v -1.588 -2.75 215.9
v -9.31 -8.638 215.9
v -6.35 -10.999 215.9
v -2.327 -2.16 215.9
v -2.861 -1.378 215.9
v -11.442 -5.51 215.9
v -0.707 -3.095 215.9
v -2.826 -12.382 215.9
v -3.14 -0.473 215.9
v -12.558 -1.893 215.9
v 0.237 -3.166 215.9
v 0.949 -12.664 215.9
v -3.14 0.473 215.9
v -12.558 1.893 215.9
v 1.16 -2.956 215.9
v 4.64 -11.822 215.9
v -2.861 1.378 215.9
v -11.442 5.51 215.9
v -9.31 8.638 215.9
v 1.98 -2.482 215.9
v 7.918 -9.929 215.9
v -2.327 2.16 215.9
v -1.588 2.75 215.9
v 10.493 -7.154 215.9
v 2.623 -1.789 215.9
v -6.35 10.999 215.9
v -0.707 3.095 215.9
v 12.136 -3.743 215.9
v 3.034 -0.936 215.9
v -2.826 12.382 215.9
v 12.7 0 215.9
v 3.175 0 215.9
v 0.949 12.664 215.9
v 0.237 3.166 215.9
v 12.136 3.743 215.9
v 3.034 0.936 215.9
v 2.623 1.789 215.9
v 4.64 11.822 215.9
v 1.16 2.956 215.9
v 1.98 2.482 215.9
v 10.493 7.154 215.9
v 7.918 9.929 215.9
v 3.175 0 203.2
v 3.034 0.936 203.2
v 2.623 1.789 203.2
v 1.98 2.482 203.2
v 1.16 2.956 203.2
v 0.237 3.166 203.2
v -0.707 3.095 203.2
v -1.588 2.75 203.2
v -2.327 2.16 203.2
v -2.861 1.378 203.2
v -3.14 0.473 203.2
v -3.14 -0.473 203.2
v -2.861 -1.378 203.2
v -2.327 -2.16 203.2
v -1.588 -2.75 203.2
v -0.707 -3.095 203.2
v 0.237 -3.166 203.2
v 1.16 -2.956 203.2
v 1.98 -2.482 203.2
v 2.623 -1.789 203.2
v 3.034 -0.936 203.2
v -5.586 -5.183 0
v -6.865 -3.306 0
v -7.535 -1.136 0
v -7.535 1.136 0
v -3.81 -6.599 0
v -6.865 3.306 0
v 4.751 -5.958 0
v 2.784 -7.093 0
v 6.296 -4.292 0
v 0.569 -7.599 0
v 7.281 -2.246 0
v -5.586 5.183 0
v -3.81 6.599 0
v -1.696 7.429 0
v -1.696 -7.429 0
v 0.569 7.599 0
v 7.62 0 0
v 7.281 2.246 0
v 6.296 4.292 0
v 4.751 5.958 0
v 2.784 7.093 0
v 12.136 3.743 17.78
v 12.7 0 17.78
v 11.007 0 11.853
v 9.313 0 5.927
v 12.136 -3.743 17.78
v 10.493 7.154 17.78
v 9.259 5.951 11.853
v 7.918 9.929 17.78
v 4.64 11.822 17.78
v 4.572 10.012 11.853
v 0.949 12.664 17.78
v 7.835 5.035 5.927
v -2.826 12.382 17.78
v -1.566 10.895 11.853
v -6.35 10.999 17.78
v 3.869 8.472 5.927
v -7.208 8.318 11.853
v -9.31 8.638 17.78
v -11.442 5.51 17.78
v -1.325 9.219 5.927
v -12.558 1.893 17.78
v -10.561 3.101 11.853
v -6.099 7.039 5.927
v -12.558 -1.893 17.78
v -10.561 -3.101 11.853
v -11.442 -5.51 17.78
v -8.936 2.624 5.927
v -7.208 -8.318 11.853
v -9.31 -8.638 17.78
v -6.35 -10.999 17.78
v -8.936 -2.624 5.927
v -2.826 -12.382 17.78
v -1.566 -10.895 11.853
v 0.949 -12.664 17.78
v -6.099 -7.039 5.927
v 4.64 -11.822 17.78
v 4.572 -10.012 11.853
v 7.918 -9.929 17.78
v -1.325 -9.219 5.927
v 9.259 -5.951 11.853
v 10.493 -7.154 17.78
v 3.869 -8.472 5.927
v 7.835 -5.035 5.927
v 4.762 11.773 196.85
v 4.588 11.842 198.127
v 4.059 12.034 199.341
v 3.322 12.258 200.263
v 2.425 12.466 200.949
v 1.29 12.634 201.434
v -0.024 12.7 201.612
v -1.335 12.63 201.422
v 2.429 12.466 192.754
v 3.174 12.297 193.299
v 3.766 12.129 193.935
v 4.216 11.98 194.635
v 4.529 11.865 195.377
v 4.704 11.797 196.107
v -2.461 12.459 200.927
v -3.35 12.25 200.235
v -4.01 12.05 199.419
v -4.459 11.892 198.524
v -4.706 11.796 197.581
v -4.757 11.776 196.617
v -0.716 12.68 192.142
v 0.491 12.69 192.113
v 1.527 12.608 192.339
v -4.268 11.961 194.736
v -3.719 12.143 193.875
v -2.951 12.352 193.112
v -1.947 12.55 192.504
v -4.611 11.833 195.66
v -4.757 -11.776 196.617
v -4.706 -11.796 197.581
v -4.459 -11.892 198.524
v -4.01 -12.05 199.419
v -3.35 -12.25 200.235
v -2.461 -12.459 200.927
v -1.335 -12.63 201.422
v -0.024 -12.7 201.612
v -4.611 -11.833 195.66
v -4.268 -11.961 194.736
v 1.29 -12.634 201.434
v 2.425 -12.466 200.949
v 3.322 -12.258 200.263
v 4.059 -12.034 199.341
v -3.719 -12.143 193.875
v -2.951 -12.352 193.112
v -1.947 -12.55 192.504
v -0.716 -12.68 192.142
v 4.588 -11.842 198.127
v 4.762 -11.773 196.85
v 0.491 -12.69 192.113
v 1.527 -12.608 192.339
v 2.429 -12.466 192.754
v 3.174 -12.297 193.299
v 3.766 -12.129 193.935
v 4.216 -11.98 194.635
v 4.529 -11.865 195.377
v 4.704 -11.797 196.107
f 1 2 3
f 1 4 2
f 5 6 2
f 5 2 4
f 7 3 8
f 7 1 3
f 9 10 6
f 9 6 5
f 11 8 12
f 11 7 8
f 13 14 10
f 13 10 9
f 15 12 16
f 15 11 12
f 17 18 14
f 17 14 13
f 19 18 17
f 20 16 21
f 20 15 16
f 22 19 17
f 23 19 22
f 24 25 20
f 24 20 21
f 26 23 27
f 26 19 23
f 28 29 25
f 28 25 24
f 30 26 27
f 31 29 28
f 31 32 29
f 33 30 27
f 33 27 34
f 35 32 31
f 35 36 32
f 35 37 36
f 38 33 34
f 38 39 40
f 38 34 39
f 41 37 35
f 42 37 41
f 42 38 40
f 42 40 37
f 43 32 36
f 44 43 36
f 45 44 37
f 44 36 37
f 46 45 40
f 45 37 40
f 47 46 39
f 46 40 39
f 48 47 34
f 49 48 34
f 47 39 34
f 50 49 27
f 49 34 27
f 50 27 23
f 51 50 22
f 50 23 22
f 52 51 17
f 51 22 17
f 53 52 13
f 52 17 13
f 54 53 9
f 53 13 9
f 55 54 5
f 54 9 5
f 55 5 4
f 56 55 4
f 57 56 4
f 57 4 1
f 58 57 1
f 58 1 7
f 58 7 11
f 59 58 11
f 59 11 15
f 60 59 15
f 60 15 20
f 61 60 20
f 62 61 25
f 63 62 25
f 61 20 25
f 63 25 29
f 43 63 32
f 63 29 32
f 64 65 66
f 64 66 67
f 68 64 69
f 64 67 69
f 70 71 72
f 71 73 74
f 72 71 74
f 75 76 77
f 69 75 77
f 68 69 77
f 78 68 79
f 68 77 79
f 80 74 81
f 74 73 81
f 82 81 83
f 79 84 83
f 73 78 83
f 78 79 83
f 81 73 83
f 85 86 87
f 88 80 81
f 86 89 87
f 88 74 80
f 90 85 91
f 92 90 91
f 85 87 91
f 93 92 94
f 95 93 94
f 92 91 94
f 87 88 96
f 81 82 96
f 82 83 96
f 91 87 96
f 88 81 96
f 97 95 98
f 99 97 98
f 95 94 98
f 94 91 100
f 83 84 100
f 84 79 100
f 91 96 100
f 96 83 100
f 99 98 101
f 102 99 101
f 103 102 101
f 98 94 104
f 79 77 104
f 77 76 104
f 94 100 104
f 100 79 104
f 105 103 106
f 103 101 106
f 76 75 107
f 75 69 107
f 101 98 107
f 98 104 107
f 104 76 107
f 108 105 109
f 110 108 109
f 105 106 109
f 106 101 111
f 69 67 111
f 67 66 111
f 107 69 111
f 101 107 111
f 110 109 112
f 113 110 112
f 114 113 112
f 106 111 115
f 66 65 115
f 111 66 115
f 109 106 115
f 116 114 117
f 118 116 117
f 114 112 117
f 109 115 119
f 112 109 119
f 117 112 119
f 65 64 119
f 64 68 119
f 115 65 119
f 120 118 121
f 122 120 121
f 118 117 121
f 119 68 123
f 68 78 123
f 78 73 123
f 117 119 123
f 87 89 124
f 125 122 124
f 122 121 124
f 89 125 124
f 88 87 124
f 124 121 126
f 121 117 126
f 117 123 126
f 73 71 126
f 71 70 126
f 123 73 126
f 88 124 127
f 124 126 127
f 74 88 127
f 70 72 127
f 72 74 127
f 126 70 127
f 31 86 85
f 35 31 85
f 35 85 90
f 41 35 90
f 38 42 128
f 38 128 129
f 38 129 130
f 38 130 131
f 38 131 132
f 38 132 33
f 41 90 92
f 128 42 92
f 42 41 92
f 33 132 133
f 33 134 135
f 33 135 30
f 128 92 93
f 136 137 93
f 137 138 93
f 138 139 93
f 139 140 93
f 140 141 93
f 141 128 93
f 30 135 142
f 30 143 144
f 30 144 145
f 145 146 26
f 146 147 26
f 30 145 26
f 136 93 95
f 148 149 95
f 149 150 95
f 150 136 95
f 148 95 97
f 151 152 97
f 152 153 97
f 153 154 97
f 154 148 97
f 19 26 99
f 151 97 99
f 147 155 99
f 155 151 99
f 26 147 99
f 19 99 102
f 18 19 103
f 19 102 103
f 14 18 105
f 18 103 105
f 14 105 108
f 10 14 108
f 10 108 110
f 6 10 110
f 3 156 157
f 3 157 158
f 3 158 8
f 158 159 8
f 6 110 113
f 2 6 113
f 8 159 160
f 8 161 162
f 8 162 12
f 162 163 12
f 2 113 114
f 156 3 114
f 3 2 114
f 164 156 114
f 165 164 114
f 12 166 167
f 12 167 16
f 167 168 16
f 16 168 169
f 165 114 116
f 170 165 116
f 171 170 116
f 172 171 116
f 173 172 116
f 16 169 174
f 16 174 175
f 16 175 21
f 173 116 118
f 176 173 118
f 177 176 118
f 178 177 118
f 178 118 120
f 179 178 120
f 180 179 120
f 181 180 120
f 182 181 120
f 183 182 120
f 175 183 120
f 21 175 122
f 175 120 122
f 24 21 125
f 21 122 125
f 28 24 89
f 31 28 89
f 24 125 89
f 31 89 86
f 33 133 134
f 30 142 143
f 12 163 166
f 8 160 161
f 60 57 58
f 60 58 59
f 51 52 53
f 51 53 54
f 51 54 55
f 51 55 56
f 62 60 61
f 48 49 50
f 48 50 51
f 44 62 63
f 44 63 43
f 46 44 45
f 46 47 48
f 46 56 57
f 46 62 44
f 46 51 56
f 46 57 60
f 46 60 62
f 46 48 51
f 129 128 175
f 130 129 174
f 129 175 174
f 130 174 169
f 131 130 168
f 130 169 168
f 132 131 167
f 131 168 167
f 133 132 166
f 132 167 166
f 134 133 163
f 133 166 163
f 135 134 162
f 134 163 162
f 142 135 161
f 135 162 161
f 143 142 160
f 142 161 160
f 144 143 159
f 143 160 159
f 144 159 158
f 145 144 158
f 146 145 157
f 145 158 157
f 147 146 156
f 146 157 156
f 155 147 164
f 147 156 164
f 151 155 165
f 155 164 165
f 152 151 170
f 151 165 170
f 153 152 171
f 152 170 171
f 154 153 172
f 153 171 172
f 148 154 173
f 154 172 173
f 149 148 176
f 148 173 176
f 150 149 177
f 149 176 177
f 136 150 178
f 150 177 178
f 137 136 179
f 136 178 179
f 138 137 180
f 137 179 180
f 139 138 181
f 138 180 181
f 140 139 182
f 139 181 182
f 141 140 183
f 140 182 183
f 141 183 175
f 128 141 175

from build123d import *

# Parameters (mm, degrees)
F0_R          = 12.7
F1_DEPTH      = 215.9
F2_SIZE2      = 5.08
F2_SIZE       = 17.78
F3_R          = 4.7625
F4_DEPTH      = 25.4
F4_DEPTH_BACK = 25.4
F5_R          = 3.175
F6_DEPTH      = 12.7


with BuildPart() as f1:
    # F0 (on Top) → F1 (new body)
    with BuildSketch(Plane.XY):
        Circle(F0_R)
    extrude(amount=F1_DEPTH)

    # F2
    f2_edges = [f1.edges().sort_by_distance(p)[0] for p in [
        (-12.7, 0, 0),
    ]]
    chamfer(f2_edges, length=F2_SIZE, length2=F2_SIZE2)

    # F3 (on Front) → F4 (cut, two sides)
    with BuildSketch(Plane.XZ) as f4_sk:
        with Locations((0, 196.85)):
            Circle(F3_R)
    extrude(amount=F4_DEPTH, mode=Mode.SUBTRACT)
    extrude(f4_sk.sketch, amount=-F4_DEPTH_BACK, mode=Mode.SUBTRACT)

    # F5 (on face) → F6 (cut)
    with BuildSketch(Plane.XY.offset(215.9)):
        Circle(F5_R)
    extrude(amount=-F6_DEPTH, mode=Mode.SUBTRACT)


solid = f1.part
